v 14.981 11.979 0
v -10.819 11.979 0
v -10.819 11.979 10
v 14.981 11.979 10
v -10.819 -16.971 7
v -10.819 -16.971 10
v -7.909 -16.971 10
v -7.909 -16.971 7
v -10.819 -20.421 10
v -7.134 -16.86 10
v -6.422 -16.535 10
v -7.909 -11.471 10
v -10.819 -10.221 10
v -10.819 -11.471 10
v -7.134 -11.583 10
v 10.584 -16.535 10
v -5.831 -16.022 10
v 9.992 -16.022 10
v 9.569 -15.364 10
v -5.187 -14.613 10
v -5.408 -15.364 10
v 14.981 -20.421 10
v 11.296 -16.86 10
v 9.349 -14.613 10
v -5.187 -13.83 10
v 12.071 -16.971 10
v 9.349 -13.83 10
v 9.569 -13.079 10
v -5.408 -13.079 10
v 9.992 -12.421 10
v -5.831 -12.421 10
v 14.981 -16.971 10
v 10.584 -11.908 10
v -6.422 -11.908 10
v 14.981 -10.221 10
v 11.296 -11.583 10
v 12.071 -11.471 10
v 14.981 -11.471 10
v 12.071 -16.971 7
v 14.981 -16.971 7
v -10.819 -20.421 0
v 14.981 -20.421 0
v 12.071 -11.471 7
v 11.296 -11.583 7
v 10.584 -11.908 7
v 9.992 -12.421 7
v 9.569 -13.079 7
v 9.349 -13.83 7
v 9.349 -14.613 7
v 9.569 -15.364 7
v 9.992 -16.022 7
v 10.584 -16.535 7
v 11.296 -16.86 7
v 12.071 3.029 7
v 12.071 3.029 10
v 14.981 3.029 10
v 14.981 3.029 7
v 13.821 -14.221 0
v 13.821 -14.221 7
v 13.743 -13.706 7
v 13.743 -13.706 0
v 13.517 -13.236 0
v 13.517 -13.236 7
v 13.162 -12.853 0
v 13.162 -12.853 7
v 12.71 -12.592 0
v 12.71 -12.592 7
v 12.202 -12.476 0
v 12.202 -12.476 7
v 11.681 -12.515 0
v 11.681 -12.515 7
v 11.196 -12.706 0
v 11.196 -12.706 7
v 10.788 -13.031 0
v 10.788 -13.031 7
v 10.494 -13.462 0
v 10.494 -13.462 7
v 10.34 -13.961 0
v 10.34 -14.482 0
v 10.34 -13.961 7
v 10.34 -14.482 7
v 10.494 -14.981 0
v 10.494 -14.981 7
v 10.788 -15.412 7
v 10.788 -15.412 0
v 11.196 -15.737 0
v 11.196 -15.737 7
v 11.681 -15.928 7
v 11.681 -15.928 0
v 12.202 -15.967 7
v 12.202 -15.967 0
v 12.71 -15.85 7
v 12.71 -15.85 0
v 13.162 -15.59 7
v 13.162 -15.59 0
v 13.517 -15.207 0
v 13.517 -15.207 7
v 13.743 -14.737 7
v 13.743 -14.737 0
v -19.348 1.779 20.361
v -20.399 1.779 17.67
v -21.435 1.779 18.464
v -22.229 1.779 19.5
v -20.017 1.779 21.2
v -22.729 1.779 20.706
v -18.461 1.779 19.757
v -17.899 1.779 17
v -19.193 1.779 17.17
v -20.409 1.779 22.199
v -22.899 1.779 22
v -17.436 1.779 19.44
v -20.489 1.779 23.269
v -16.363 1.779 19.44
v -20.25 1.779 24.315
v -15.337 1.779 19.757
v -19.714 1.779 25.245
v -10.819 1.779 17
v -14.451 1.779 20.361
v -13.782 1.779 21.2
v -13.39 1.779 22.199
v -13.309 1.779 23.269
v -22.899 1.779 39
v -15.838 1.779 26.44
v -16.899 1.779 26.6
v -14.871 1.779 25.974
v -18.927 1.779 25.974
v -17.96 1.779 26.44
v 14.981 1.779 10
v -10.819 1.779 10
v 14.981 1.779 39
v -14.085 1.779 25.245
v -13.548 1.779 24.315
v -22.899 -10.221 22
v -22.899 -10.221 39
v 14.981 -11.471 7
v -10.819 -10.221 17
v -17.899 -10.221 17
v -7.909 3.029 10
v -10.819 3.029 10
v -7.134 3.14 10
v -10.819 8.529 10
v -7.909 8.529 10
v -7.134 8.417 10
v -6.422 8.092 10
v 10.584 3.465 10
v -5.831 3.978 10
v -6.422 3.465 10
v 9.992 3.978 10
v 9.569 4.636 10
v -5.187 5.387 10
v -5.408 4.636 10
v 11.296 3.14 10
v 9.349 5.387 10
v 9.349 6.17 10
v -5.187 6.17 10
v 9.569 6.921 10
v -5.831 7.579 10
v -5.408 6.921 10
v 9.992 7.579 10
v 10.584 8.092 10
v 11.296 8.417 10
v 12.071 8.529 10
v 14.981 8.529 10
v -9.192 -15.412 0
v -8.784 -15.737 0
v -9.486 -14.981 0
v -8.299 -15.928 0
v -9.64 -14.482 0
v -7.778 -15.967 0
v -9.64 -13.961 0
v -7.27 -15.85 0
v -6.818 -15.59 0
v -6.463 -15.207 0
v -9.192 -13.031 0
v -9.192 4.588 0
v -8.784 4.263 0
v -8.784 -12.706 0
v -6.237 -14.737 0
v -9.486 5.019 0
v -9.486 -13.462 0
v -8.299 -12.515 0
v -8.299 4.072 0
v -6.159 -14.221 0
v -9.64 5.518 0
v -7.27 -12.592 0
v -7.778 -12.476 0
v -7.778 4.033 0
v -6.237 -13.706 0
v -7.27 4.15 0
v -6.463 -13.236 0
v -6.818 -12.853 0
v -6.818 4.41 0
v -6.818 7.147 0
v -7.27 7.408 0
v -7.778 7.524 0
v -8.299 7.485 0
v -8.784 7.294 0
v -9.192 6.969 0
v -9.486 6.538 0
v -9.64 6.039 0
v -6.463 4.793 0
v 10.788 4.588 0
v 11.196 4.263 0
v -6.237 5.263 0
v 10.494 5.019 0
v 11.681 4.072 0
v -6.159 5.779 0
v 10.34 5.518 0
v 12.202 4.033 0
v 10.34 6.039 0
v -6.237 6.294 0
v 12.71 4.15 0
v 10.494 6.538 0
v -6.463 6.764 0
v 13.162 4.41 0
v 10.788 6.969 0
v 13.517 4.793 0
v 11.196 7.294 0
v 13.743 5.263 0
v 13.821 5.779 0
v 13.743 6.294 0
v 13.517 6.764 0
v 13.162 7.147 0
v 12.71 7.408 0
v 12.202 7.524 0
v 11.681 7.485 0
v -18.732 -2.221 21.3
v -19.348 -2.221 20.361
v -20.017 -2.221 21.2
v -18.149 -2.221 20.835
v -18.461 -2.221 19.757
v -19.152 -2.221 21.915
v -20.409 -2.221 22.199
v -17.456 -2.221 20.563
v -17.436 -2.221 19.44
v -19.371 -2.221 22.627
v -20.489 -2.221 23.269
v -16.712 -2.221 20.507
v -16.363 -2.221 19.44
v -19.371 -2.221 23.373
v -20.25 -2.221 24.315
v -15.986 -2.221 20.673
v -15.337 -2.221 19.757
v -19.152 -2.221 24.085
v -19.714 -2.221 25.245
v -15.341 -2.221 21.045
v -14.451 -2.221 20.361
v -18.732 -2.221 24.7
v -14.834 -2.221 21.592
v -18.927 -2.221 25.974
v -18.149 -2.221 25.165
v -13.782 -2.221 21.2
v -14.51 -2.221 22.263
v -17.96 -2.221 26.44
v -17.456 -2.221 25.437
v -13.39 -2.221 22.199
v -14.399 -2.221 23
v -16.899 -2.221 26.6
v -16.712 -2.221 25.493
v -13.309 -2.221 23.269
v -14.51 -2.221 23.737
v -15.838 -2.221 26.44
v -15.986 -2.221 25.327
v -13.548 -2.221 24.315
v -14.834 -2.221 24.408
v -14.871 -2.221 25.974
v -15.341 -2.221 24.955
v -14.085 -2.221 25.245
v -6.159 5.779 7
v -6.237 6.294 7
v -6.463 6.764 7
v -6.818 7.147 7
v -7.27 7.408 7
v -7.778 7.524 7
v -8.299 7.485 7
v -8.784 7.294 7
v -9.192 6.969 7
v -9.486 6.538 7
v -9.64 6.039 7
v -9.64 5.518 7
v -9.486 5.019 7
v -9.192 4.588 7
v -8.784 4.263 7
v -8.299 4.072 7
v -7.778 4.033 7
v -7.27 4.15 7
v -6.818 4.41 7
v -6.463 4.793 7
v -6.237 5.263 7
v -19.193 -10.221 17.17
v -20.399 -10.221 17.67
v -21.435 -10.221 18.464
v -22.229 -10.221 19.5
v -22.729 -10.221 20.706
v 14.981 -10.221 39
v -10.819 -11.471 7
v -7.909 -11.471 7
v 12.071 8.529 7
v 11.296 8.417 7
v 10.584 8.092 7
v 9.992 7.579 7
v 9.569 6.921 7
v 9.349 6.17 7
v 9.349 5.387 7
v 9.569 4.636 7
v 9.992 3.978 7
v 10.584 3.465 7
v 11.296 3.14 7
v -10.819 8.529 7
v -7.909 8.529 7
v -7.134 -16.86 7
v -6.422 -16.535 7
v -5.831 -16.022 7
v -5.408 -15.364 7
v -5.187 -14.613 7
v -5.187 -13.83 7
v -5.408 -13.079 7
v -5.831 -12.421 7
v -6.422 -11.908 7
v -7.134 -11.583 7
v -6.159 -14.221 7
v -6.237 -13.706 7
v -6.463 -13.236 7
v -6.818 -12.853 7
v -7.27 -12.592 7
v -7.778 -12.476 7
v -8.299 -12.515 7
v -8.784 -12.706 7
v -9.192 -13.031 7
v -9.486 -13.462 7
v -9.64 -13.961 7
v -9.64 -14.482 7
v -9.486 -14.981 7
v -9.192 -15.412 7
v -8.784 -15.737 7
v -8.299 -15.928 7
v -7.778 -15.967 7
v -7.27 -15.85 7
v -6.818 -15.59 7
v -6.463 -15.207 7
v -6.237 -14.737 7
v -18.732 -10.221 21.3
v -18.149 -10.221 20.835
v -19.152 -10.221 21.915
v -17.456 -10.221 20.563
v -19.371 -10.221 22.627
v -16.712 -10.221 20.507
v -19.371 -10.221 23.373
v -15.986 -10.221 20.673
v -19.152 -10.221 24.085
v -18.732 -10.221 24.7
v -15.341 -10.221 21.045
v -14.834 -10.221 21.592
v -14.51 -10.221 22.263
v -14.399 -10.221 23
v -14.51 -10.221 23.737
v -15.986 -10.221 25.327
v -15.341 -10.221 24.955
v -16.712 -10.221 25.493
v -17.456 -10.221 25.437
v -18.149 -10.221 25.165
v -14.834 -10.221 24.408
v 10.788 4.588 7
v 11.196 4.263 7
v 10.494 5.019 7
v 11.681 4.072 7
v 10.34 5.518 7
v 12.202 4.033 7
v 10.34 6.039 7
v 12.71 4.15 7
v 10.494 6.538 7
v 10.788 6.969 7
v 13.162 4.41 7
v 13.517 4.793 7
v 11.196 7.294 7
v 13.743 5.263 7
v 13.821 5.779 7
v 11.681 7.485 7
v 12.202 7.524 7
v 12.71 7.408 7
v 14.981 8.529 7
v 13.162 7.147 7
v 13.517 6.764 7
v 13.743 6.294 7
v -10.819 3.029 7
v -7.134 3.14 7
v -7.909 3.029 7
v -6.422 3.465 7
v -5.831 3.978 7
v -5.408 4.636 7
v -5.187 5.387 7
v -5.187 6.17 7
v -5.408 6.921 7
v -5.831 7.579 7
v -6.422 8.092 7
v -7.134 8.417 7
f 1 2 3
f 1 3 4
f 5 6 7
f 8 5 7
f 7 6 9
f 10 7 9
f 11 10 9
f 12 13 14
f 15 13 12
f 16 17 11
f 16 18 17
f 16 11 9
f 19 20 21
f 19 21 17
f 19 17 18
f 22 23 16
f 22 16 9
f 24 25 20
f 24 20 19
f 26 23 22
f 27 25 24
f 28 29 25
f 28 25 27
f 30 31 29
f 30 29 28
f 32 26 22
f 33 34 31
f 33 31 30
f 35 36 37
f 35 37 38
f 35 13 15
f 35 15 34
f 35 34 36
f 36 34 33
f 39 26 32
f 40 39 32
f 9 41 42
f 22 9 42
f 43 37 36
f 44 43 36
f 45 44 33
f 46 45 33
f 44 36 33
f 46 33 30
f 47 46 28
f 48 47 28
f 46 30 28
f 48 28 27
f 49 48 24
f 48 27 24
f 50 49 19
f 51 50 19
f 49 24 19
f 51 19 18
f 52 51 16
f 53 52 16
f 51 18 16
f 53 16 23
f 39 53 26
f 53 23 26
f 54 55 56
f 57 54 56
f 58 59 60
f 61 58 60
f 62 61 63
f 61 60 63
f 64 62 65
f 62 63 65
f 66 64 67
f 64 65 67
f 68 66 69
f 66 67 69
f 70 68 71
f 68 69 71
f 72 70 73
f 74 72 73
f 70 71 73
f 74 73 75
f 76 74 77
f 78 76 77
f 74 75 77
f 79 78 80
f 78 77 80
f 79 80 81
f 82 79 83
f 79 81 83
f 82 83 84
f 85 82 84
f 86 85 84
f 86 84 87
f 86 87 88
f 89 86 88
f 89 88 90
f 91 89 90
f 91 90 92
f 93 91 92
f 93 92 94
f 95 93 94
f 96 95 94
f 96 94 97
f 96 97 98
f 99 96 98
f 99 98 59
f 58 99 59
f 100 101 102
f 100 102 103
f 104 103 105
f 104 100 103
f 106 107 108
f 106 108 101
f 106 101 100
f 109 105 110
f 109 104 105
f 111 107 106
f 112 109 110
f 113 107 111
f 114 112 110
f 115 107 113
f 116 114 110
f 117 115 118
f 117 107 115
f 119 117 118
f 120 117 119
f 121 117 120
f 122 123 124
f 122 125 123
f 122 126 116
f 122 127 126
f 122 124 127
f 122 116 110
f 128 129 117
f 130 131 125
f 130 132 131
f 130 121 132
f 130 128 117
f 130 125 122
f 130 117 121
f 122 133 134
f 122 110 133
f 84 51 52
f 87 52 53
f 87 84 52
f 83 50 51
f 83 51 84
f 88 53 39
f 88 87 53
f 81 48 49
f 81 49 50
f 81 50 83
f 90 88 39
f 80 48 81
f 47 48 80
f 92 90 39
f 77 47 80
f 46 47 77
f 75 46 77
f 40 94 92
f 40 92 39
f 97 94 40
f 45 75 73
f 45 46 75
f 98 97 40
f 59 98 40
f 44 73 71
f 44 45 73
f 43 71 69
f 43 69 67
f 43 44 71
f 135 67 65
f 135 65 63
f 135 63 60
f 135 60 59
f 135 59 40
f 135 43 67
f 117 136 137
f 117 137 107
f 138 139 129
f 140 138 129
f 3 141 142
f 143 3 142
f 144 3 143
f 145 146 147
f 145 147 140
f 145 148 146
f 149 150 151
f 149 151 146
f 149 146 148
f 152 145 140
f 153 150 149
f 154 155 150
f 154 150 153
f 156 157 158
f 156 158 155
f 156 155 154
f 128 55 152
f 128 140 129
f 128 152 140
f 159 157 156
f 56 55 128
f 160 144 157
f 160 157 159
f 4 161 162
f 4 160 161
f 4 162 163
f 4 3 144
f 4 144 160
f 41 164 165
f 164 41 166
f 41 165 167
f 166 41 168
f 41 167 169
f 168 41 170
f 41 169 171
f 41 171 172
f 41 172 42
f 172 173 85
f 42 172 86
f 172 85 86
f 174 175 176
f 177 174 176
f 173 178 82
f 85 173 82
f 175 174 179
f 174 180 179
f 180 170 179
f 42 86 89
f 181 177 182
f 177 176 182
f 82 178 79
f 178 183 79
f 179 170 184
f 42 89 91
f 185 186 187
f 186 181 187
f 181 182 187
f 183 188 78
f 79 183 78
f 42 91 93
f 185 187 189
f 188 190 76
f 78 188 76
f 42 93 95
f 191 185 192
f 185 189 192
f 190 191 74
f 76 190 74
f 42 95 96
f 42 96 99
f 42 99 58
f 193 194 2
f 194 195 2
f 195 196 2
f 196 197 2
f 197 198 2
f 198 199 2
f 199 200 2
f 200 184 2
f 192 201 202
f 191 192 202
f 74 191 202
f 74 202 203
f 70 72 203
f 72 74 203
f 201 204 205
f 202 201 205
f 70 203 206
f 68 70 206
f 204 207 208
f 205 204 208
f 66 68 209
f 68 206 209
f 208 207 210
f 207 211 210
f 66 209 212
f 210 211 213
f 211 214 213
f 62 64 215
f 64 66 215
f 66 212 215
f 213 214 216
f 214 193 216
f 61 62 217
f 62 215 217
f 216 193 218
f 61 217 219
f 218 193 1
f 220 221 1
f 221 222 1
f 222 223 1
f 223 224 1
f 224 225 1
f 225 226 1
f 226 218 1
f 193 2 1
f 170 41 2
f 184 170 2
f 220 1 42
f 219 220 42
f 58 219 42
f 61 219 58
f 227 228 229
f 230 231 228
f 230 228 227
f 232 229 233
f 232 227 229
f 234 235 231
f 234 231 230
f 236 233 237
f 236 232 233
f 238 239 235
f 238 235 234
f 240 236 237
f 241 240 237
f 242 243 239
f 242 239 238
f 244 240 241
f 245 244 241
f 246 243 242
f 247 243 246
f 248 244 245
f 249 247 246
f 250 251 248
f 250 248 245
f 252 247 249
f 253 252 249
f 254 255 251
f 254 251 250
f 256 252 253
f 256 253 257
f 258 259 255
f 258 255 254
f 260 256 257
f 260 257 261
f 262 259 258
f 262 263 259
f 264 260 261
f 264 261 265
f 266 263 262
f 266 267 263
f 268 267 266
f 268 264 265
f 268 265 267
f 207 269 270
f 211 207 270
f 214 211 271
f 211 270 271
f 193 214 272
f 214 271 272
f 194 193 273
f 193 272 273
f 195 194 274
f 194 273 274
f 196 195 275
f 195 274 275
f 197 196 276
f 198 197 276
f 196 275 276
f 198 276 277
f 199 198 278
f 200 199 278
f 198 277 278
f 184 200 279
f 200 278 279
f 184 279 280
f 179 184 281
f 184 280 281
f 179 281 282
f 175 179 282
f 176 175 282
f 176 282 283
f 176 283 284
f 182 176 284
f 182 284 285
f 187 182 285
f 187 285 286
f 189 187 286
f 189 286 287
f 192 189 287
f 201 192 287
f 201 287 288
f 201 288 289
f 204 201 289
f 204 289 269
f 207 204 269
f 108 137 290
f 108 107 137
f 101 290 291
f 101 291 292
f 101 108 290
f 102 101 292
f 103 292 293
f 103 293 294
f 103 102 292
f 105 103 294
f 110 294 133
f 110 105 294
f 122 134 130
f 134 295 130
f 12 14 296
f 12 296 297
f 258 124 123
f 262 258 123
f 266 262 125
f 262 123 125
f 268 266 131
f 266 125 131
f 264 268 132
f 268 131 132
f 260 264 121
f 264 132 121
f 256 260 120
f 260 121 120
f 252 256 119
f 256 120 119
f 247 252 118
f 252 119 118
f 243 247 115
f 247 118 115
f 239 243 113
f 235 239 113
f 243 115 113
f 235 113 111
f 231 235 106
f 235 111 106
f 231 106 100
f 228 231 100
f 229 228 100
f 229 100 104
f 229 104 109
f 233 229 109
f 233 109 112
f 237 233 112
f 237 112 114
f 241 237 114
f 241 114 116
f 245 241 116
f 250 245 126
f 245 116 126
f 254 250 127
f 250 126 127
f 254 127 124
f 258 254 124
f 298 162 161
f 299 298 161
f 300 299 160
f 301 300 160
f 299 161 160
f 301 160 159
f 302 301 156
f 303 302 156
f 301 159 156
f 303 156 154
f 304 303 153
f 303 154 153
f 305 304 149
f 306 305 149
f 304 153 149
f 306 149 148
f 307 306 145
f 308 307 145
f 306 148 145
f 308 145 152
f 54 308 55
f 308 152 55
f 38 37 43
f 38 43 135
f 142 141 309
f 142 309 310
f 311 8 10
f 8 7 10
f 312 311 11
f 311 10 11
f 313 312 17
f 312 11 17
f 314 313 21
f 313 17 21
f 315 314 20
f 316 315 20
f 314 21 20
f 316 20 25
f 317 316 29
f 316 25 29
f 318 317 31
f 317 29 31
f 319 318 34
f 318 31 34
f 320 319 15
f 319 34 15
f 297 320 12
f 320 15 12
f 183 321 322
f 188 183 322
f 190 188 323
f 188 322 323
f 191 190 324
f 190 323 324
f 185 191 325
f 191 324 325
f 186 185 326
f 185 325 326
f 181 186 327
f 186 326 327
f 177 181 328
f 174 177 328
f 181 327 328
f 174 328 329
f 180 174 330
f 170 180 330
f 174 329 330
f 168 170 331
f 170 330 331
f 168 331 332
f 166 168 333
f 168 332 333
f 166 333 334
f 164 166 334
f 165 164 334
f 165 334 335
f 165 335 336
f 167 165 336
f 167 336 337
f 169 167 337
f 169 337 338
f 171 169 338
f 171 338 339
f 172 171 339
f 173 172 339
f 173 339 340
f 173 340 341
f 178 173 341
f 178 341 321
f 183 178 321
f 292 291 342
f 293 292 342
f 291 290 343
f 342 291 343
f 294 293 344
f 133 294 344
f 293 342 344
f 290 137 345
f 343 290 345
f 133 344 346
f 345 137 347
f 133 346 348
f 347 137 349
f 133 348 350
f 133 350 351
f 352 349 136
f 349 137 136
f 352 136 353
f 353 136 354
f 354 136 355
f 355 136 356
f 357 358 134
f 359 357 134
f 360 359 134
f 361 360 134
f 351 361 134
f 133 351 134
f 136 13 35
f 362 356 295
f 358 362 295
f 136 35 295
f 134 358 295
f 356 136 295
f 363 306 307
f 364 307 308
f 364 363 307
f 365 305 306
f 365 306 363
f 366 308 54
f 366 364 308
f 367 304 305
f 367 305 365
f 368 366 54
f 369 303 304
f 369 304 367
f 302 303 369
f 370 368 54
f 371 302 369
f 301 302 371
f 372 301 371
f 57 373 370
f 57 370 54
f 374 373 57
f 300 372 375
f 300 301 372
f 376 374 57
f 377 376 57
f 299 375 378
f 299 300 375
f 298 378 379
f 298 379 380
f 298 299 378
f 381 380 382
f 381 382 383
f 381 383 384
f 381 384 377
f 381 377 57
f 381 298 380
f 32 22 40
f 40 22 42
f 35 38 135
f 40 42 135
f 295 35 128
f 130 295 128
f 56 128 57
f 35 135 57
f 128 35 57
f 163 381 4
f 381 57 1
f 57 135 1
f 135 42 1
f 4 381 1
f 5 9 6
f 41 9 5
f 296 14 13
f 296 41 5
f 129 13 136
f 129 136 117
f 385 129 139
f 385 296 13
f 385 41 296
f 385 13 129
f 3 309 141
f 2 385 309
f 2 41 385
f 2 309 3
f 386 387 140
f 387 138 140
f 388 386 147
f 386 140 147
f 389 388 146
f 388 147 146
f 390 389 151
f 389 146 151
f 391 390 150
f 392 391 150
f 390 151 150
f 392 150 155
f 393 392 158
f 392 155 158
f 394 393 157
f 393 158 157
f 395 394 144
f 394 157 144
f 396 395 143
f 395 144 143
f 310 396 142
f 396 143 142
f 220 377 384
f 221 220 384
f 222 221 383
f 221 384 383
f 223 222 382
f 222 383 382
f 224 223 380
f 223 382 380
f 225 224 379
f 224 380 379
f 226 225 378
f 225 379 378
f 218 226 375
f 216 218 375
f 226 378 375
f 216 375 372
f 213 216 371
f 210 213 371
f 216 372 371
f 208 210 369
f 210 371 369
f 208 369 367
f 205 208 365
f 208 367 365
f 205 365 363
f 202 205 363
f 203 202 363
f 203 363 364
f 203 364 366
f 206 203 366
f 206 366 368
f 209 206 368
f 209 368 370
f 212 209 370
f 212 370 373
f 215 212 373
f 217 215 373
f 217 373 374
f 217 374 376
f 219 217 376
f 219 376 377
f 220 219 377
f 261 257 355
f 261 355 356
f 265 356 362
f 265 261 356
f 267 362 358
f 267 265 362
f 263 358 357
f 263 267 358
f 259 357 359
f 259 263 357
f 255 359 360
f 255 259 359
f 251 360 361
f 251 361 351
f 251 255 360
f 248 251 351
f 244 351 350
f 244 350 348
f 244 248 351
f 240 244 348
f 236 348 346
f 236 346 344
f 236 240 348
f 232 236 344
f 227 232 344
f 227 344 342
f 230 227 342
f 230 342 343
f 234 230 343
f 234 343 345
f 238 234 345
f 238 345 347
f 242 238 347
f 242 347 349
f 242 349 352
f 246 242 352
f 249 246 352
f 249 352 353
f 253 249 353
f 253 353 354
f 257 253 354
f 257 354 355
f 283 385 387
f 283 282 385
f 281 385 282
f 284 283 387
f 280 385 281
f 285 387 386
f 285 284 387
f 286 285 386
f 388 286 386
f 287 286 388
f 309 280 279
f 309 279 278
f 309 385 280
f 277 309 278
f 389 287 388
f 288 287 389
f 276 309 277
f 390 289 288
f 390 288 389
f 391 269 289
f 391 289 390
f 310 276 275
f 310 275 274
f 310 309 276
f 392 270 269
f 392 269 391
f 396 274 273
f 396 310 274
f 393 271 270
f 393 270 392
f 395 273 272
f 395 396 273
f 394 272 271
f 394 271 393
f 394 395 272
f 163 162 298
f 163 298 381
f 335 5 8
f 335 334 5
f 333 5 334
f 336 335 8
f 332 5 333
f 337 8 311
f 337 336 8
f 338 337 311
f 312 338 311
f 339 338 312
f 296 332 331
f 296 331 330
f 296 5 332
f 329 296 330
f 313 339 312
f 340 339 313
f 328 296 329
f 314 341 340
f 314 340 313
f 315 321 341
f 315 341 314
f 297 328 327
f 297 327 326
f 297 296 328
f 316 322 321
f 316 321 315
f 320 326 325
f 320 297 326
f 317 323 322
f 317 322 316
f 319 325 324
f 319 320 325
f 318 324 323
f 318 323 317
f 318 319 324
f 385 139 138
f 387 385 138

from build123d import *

# Parameters (mm, degrees)
ESQUISSE1_W             = 25.8
ESQUISSE1_H             = 32.4
BOSS_EXTRU_1_DEPTH      = 10
ESQUISSE2_W             = 25.8
ESQUISSE2_H             = 12
BOSS_EXTRU_2_DEPTH      = 29
ESQUISSE3_R             = 2.75
ENL_V_MAT_EXTRU_1_DEPTH = 3
ESQUISSE4_R             = 1.75
ENL_V_MAT_EXTRU_2_DEPTH = 7
ESQUISSE5_W             = 22
ESQUISSE5_H             = 12
BOSS_EXTRU_3_DEPTH      = 12.08
CONG_1_R                = 5
ENL_V_START             = -12
ESQUISSE6_R             = 2.5
ENL_V_MAT_EXTRU_3_DEPTH = 12
ESQUISSE7_R             = 3.6
ENL_V_MAT_EXTRU_4_DEPTH = 4
ESQUISSE8_W             = 2.91
ESQUISSE8_H             = 5.5
ENL_V_MAT_EXTRU_5_DEPTH = 3


with BuildPart() as part:
    # Esquisse1 → Boss.-Extru.1 (new body)
    with BuildSketch(Plane.XY):
        with Locations((2.080747766, -4.221428571)):
            Rectangle(ESQUISSE1_W, ESQUISSE1_H)
    extrude(amount=BOSS_EXTRU_1_DEPTH)

    # Esquisse2 → Boss.-Extru.2 (add)
    with BuildSketch(Plane.XY.offset(10)):
        with Locations((2.080747766, -4.221428571)):
            Rectangle(ESQUISSE2_W, ESQUISSE2_H)
    extrude(amount=BOSS_EXTRU_2_DEPTH)

    # Esquisse3 → Enlèv. mat.-Extru.1 (cut)
    with BuildSketch(Plane.XY.offset(10)):
        with Locations((12.070747766, 5.778571429)):
            Circle(ESQUISSE3_R)
        with Locations((-7.909252234, 5.778571429)):
            Circle(ESQUISSE3_R)
        with Locations((-7.909252234, -14.221428571)):
            Circle(ESQUISSE3_R)
        with Locations((12.070747766, -14.221428571)):
            Circle(ESQUISSE3_R)
    extrude(amount=-ENL_V_MAT_EXTRU_1_DEPTH, mode=Mode.SUBTRACT)

    # Esquisse4 → Enlèv. mat.-Extru.2 (cut)
    with BuildSketch(Plane.XY.offset(7)):
        with Locations((12.070747766, 5.778571429)):
            Circle(ESQUISSE4_R)
        with Locations((-7.909252234, 5.778571429)):
            Circle(ESQUISSE4_R)
        with Locations((12.070747766, -14.221428571)):
            Circle(ESQUISSE4_R)
        with Locations((-7.909252234, -14.221428571)):
            Circle(ESQUISSE4_R)
    extrude(amount=-ENL_V_MAT_EXTRU_2_DEPTH, mode=Mode.SUBTRACT)

    # Esquisse5 → Boss.-Extru.3 (add)
    with BuildSketch(Plane.ZY.offset(10.819252234)):
        with Locations((28, -4.221428571)):
            Rectangle(ESQUISSE5_W, ESQUISSE5_H)
    extrude(amount=BOSS_EXTRU_3_DEPTH)

    # Congé1
    cong_1_edges = [part.edges().sort_by_distance(p)[0] for p in [
        (-22.899252234, -4.221428571, 17),
    ]]
    fillet(cong_1_edges, radius=CONG_1_R)

    # Esquisse6 → Enlèv. mat.-Extru.3 (cut)
    with BuildSketch(Plane.XZ.offset(10.221428571).offset(ENL_V_START)):
        with Locations((-16.899252234, 23)):
            Circle(ESQUISSE6_R)
    extrude(amount=ENL_V_MAT_EXTRU_3_DEPTH, mode=Mode.SUBTRACT)

    # Esquisse7 → Enlèv. mat.-Extru.4 (cut)
    with BuildSketch(Plane(origin=(0, 1.778571429, 0), x_dir=(1, 0, 0), z_dir=(0, 1, 0))):
        with Locations(Location((-16.899252234, -23, 0), (0, 0, 270))):
            Circle(ESQUISSE7_R)
    extrude(amount=-ENL_V_MAT_EXTRU_4_DEPTH, mode=Mode.SUBTRACT)

    # Esquisse8 → Enlèv. mat.-Extru.5 (cut)
    with BuildSketch(Plane.XY.offset(10)):
        with Locations((13.525747766, -14.221428571)):
            Rectangle(ESQUISSE8_W, ESQUISSE8_H)
        with Locations((13.525747766, 5.778571429)):
            Rectangle(ESQUISSE8_W, ESQUISSE8_H)
        with Locations((-9.364252234, 5.778571429)):
            Rectangle(ESQUISSE8_W, ESQUISSE8_H)
        with Locations((-9.364252234, -14.221428571)):
            Rectangle(ESQUISSE8_W, ESQUISSE8_H)
    extrude(amount=-ENL_V_MAT_EXTRU_5_DEPTH, mode=Mode.SUBTRACT)


solid = part.part
